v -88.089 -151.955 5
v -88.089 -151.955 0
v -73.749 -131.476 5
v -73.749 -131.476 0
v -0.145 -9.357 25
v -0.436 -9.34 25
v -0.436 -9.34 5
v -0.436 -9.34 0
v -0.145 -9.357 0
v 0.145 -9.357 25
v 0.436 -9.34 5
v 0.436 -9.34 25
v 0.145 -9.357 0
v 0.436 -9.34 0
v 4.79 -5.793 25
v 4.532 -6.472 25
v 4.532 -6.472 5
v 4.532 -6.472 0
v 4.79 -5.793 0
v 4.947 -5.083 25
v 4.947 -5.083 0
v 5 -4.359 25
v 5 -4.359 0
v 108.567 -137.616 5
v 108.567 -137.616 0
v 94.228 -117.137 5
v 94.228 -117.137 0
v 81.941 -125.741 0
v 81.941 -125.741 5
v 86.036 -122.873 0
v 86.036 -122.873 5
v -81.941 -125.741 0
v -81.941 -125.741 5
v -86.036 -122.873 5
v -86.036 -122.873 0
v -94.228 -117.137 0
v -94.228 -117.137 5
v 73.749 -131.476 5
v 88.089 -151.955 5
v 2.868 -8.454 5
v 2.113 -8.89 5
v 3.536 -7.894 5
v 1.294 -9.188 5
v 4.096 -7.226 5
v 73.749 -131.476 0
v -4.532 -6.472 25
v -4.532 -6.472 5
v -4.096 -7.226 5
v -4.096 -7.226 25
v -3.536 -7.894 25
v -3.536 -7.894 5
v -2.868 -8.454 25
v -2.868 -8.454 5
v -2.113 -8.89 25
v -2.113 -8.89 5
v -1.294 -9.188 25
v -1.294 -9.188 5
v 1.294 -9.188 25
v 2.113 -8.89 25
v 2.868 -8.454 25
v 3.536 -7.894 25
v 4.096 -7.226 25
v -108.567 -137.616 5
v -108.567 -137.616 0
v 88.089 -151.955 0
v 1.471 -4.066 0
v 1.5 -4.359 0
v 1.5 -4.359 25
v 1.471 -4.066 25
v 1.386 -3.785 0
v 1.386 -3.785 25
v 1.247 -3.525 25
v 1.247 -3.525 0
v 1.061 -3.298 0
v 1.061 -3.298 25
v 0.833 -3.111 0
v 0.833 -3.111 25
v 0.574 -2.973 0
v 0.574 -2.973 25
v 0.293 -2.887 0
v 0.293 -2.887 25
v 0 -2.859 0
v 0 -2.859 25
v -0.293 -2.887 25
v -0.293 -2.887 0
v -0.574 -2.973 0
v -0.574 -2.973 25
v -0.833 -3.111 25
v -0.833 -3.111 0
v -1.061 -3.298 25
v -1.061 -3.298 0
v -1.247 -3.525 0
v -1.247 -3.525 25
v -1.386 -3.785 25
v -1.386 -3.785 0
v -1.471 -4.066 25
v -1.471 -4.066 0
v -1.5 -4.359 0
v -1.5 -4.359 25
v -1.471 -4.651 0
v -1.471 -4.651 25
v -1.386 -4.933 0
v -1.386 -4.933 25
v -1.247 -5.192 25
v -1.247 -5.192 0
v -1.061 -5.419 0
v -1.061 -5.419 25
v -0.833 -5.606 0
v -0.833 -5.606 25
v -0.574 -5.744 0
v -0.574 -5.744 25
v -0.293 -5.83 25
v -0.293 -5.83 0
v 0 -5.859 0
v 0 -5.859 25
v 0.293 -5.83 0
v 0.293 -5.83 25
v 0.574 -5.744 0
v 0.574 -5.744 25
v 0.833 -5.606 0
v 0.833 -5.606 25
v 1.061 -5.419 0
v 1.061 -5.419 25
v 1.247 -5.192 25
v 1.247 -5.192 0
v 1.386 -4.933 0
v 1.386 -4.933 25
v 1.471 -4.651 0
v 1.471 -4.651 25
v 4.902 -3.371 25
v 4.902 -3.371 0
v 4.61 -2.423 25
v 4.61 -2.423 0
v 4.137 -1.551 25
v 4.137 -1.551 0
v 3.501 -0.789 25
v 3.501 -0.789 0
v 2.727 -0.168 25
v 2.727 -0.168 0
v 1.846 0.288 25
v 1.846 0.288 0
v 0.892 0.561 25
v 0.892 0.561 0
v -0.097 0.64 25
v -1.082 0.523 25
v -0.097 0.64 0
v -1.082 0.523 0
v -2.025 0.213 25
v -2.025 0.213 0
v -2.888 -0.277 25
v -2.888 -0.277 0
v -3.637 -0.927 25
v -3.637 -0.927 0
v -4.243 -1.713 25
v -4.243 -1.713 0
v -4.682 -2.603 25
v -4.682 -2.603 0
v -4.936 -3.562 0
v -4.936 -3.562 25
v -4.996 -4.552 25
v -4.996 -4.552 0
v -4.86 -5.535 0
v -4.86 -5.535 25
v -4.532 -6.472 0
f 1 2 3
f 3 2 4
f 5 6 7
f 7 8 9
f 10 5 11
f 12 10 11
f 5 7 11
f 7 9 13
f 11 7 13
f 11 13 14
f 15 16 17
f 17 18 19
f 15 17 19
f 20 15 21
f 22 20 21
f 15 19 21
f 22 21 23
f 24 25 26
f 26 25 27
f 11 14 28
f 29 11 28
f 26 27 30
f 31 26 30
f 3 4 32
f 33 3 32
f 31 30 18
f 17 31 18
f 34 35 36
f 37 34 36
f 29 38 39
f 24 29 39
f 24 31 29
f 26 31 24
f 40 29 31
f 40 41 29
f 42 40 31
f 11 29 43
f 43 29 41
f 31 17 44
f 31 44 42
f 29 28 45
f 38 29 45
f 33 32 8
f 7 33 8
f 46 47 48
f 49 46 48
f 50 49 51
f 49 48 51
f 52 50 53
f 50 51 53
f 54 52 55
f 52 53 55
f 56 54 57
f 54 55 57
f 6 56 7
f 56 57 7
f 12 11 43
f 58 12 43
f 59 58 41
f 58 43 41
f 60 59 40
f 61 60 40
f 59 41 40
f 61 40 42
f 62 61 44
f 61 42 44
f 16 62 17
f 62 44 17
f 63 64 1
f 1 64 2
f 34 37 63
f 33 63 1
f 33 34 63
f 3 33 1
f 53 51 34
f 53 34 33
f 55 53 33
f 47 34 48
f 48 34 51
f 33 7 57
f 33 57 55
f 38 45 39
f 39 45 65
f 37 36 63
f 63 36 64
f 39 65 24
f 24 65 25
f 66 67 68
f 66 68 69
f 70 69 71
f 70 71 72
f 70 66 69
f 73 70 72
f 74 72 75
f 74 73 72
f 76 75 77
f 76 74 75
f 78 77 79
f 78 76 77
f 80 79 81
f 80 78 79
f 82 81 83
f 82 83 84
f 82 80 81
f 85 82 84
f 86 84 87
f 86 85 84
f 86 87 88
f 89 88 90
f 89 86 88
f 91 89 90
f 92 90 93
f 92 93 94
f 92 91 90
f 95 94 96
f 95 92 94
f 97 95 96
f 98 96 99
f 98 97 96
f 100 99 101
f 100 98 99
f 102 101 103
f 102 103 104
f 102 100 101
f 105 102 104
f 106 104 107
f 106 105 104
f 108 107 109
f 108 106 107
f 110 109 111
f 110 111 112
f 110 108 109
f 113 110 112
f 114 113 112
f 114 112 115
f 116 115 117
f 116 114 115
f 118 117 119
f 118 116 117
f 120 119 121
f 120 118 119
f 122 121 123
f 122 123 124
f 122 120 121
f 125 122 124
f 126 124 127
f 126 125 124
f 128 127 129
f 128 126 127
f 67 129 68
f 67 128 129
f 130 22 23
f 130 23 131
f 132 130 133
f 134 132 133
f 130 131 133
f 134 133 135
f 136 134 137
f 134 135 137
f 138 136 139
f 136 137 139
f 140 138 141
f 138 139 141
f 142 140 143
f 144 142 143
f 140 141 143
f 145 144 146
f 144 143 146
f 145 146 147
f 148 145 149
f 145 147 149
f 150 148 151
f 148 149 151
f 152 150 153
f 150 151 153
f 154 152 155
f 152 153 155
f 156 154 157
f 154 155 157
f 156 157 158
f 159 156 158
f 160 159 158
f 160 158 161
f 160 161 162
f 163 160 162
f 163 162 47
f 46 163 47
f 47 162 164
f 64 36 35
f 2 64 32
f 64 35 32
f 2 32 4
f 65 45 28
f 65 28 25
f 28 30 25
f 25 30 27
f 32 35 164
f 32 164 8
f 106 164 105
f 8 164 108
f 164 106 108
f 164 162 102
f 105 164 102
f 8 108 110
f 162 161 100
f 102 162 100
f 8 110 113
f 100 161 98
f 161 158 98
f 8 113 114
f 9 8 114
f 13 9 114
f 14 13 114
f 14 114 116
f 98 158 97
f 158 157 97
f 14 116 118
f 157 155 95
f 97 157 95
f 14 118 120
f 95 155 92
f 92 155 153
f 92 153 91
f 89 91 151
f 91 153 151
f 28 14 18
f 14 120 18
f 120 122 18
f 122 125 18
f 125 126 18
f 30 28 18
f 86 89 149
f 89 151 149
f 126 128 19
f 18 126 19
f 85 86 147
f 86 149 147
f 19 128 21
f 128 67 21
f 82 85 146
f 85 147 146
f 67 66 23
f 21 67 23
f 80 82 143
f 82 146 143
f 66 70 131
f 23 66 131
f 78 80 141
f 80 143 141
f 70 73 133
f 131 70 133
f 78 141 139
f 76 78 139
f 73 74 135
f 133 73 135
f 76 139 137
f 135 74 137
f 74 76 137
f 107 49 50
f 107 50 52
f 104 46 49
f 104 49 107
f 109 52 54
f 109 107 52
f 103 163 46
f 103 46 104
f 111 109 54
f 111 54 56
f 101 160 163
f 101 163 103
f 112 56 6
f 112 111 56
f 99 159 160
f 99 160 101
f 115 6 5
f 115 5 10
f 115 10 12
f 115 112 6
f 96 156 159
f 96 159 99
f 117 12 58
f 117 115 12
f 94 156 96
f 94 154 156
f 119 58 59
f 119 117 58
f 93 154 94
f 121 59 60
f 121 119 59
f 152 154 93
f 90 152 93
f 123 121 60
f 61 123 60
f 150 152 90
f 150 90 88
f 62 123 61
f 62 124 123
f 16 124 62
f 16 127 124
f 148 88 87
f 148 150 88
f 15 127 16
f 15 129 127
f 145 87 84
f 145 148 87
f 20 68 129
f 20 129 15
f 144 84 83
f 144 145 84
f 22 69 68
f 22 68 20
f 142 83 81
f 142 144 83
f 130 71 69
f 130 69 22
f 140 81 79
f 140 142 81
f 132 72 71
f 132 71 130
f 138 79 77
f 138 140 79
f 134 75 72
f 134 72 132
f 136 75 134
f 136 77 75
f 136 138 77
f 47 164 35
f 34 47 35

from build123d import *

# Parameters (mm, degrees)
F1_DEPTH = 5
F0_R     = 1.5
F2_DEPTH = 25


with BuildPart() as f1:
    # F0 (on Top) → F1 (new body)
    with BuildSketch(Plane.XY):
        with BuildLine():
            Line((-4.5315389352, -6.4717082978), (-86.0364654527, -122.8728066433))
            Line((-86.0364654527, -122.8728066433), (-81.9407052312, -125.7406888251))
            Line((-81.9407052312, -125.7406888251), (-0.4357787137, -9.3395904795))
            ThreePointArc((-0.4357787137, -9.3395904795), (-2.8678821818, -8.4543772105), (-4.5315389352, -6.4717082978))
        make_face()
        Polygon((-86.0364654527, -122.8728066433), (-94.2279858955, -117.1370422798), (-108.5673968043, -137.6158433871), (-88.0885956971, -151.9552542958), (-73.7491847883, -131.4764531886), (-81.9407052312, -125.7406888251), align=None)
    extrude(amount=F1_DEPTH)



with BuildPart() as f1b:
    # F0 (on Top) → F1, piece 2 (new body)
    with BuildSketch(Plane.XY):
        with BuildLine():
            ThreePointArc((4.5315389352, -6.4717082978), (2.8678821818, -8.4543772105), (0.4357787137, -9.3395904795))
            Line((0.4357787137, -9.3395904795), (81.9407052312, -125.7406888251))
            Line((81.9407052312, -125.7406888251), (86.0364654527, -122.8728066433))
            Line((86.0364654527, -122.8728066433), (4.5315389352, -6.4717082978))
        make_face()
        Polygon((86.0364654527, -122.8728066433), (81.9407052312, -125.7406888251), (73.7491847883, -131.4764531886), (88.0885956971, -151.9552542958), (108.5673968043, -137.6158433871), (94.2279858955, -117.1370422798), align=None)
    extrude(amount=F1_DEPTH)


with BuildPart() as f1_1:
    add(f1.part)

    add(f1b.part)  # F2 merges F1b
    # F0 (on Top) → F2 (join)
    with BuildSketch(Plane.XY):
        with BuildLine():
            ThreePointArc((5, -4.3586169891), (-1.0821980697, 0.5228630465), (-4.5315389352, -6.4717082978))
            ThreePointArc((-4.5315389352, -6.4717082978), (-2.8678821818, -8.4543772105), (-0.4357787137, -9.3395904795))
            ThreePointArc((-0.4357787137, -9.3395904795), (0, -9.3586169891), (0.4357787137, -9.3395904795))
            ThreePointArc((0.4357787137, -9.3395904795), (2.8678821818, -8.4543772105), (4.5315389352, -6.4717082978))
            ThreePointArc((4.5315389352, -6.4717082978), (4.8814800356, -5.4408150587), (5, -4.3586169891))
        make_face()
        with Locations((0, -4.3586169891)):
            Circle(F0_R, mode=Mode.SUBTRACT)
    extrude(amount=F2_DEPTH)


solid = f1_1.part
